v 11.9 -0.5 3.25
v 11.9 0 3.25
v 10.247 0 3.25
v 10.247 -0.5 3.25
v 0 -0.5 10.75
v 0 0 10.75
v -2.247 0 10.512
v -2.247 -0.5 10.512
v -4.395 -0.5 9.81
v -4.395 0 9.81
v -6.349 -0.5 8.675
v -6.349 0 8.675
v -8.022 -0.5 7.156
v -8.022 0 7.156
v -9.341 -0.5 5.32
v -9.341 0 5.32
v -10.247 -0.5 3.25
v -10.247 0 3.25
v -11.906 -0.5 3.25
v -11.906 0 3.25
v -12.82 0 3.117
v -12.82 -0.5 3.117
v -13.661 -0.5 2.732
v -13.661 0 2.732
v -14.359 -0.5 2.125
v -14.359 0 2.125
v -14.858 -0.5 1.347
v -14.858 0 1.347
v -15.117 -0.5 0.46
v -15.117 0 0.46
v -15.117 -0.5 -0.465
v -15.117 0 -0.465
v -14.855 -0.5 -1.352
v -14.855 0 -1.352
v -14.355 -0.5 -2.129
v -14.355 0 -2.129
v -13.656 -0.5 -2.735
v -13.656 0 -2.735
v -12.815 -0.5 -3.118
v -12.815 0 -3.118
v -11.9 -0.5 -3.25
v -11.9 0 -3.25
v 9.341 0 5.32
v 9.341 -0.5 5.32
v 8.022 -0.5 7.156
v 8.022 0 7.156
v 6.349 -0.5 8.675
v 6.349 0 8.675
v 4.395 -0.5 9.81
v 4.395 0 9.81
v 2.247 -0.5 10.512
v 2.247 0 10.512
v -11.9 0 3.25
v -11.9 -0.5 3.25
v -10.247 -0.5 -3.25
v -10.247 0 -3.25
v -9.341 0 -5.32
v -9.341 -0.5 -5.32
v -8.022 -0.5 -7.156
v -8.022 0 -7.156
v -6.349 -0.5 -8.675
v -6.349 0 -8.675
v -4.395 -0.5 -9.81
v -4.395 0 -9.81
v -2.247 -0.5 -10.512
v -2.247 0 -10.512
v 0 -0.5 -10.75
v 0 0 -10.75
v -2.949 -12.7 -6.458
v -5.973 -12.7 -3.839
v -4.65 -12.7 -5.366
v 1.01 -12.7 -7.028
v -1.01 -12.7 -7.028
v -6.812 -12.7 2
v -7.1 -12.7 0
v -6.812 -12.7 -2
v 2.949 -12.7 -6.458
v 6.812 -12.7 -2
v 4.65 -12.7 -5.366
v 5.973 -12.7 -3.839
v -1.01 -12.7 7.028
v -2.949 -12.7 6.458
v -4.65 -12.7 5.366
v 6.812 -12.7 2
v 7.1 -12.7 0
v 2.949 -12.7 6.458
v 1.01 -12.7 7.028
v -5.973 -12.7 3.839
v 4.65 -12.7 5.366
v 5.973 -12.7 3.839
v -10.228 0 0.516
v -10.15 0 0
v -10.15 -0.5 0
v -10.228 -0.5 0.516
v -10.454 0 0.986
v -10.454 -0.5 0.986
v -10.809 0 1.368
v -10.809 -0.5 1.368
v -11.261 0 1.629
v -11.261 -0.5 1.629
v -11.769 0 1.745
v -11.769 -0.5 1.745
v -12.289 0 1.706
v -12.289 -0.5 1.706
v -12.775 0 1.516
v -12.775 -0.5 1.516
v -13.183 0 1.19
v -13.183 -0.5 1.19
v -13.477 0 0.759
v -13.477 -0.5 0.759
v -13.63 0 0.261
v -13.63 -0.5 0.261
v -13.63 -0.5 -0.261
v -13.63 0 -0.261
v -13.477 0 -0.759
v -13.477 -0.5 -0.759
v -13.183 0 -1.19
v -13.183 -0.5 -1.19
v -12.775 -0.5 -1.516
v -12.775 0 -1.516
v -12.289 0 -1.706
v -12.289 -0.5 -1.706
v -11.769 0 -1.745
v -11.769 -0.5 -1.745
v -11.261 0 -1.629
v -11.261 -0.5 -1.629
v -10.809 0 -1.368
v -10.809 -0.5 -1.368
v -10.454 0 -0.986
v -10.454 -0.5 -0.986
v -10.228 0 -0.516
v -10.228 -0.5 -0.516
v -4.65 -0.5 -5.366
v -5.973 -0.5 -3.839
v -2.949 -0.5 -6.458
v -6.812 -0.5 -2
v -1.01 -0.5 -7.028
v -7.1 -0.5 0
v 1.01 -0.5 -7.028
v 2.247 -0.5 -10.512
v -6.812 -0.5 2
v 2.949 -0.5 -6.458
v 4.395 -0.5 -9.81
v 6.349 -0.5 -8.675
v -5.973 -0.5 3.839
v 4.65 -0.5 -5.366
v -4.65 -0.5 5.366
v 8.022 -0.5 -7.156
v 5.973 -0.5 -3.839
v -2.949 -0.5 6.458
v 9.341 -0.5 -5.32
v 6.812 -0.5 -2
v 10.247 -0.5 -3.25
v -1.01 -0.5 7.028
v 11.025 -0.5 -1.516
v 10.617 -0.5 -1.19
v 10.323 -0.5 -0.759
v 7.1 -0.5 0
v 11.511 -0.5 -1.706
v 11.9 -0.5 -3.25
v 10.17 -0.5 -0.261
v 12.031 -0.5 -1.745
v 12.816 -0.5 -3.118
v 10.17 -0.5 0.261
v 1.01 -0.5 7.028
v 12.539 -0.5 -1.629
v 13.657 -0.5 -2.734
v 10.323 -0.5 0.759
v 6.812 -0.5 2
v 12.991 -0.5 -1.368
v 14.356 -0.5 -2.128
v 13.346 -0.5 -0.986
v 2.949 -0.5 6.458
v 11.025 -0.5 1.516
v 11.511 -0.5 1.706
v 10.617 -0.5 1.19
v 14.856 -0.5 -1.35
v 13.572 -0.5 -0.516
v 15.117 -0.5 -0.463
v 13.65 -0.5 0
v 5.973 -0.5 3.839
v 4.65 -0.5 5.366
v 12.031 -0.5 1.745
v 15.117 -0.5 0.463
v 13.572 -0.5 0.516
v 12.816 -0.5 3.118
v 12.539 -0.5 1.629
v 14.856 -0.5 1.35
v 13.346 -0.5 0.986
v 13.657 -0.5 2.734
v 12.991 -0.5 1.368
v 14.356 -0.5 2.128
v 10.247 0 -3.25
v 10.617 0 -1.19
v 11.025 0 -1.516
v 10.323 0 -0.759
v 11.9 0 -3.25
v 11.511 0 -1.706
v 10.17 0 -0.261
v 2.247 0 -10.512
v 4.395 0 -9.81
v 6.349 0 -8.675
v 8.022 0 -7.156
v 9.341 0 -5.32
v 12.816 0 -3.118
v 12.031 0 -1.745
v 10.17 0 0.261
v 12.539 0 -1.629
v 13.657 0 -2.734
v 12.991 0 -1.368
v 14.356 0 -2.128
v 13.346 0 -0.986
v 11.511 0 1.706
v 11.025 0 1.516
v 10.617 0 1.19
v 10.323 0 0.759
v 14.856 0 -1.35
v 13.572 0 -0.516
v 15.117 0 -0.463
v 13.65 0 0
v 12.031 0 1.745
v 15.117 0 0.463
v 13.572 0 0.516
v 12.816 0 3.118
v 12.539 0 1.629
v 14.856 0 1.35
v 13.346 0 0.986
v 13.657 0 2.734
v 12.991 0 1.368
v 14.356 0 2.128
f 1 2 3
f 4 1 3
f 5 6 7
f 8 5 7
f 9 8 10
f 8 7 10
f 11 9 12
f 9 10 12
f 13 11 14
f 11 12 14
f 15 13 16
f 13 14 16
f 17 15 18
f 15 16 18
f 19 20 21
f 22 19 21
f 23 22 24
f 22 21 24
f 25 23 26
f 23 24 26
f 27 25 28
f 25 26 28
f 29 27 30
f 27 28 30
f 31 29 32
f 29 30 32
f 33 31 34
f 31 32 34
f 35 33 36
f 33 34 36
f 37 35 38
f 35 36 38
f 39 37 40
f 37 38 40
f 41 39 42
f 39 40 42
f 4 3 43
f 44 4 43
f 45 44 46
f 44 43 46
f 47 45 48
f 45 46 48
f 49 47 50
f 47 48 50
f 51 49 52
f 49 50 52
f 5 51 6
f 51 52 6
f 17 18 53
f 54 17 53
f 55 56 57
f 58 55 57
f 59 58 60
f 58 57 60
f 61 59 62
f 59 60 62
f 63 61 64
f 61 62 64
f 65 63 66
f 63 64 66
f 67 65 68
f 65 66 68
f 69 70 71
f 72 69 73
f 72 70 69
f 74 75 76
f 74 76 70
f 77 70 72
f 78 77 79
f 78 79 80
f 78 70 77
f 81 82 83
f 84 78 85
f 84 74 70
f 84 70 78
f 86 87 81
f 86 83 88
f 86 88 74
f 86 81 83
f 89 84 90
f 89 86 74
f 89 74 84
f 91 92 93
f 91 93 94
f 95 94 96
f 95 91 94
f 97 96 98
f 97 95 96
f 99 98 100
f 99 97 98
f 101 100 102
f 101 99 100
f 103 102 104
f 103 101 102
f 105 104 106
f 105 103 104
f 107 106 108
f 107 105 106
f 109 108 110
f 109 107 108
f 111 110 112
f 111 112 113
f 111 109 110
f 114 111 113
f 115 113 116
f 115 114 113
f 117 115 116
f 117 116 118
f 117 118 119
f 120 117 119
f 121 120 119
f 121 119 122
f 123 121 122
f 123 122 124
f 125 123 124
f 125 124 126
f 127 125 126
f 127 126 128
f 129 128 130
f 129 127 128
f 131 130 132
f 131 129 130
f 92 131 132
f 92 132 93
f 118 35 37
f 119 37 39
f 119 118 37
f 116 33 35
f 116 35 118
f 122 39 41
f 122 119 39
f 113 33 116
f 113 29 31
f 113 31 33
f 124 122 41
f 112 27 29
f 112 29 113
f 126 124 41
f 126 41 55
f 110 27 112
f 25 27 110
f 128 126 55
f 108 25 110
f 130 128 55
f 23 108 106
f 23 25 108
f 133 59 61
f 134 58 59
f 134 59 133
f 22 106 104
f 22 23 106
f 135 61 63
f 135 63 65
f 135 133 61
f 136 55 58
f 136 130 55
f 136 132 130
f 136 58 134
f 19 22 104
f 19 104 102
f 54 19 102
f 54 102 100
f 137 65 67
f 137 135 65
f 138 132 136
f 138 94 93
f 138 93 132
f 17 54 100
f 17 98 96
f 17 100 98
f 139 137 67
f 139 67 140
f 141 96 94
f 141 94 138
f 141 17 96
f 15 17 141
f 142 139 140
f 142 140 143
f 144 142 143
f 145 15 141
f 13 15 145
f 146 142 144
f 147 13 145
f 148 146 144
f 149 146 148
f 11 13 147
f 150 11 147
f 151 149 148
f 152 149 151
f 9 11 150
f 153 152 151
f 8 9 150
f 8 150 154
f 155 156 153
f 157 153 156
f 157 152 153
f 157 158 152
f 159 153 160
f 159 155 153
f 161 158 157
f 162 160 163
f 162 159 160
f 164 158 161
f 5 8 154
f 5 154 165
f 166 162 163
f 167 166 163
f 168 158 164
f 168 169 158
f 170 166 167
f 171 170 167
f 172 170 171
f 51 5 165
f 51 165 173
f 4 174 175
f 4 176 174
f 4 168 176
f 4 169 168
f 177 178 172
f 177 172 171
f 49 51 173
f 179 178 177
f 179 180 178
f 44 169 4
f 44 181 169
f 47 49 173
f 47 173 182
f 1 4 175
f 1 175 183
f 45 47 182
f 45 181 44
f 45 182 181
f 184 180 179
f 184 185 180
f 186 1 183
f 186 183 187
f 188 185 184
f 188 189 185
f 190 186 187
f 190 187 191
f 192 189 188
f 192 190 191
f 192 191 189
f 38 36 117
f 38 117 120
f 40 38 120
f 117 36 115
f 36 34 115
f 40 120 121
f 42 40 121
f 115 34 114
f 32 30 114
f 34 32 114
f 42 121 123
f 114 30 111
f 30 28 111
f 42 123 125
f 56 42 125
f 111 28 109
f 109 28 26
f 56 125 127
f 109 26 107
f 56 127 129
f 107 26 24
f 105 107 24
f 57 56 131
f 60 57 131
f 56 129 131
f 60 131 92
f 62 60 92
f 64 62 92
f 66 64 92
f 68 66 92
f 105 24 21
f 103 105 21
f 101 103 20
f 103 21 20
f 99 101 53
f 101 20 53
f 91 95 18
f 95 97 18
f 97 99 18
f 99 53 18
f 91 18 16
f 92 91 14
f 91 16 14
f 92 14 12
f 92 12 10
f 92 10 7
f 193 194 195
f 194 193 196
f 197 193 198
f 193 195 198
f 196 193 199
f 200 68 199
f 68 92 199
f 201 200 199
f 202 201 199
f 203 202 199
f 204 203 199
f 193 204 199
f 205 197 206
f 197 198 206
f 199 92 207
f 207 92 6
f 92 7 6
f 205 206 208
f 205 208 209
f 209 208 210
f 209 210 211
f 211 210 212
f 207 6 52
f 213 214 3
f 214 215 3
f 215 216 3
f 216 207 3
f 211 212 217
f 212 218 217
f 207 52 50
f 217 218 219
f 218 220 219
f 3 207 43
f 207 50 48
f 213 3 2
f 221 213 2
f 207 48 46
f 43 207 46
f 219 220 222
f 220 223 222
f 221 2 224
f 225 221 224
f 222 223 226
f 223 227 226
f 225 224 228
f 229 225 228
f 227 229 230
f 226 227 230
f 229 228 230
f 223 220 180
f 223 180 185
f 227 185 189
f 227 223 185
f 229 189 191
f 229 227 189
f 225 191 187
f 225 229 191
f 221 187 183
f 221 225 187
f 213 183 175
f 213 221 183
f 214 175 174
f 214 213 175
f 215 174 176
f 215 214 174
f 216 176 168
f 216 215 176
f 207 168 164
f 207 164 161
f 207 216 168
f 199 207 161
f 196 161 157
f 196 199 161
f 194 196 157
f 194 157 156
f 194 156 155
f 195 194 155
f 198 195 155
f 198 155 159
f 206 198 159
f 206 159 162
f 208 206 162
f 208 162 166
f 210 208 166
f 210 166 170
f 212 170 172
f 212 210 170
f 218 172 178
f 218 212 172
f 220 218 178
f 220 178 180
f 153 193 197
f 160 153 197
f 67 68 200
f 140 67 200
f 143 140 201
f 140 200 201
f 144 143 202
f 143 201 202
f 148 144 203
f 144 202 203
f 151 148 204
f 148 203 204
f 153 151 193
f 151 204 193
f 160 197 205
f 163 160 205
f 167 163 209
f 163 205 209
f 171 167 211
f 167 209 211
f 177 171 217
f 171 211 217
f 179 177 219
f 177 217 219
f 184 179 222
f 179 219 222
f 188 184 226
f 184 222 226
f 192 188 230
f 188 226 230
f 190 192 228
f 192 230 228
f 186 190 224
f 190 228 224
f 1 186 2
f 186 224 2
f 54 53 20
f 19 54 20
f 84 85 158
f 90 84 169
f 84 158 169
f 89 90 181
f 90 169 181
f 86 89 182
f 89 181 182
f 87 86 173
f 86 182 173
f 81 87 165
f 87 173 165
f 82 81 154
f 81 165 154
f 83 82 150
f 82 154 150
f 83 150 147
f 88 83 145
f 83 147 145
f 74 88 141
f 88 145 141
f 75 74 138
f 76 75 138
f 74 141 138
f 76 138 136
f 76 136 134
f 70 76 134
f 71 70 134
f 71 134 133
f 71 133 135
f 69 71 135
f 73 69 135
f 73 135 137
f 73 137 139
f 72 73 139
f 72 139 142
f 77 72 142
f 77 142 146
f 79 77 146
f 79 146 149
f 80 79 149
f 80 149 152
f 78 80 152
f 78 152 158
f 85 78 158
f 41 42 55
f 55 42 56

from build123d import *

# Parameters (mm, degrees)
F0_R     = 7.1
F1_DEPTH = 12.7
F2_R     = 1.75
F3_DEPTH = 0.5


# Not quite as in the source:
# - ends of sketch curves that miss each other by under 0.0002 mm in the source are joined


with BuildPart() as f1:
    # F0 (on Front) → F1 (new body)
    with BuildSketch(Plane.XZ):
        Circle(F0_R)
    extrude(amount=F1_DEPTH)

    # F2 (on Front) → F3 (join)
    with BuildSketch(Plane.XZ):
        with BuildLine():
            Line((10.246950766, -3.25), (11.9, -3.25))
            ThreePointArc((11.9, -3.25), (15.15, 0), (11.9, 3.25))
            Line((11.9, 3.25), (10.2469522811, 3.25))
            ThreePointArc((10.2469522811, 3.25), (6.3492135874, 8.6746768166), (0, 10.7500014442))
            ThreePointArc((0, 10.7500014442), (-6.3492135874, 8.6746768166), (-10.2469522811, 3.25))
            Line((-10.2469522811, 3.25), (-11.9, 3.249995223))
            Line((-11.9, 3.249995223), (-11.9055723148, 3.249995223))
            ThreePointArc((-11.9055723148, 3.249995223), (-15.1499988057, -0.0027861584), (-11.9, -3.25))
            Line((-11.9, -3.25), (-10.246950766, -3.25))
            ThreePointArc((-10.246950766, -3.25), (-6.3492125496, -8.6746757864), (0, -10.75))
            ThreePointArc((0, -10.75), (6.3492125496, -8.6746757864), (10.246950766, -3.25))
        make_face()
        with Locations((-11.9, 0)):
            Circle(F2_R, mode=Mode.SUBTRACT)
        with Locations((11.9, 0)):
            Circle(F2_R, mode=Mode.SUBTRACT)
    extrude(amount=F3_DEPTH)


solid = f1.part
